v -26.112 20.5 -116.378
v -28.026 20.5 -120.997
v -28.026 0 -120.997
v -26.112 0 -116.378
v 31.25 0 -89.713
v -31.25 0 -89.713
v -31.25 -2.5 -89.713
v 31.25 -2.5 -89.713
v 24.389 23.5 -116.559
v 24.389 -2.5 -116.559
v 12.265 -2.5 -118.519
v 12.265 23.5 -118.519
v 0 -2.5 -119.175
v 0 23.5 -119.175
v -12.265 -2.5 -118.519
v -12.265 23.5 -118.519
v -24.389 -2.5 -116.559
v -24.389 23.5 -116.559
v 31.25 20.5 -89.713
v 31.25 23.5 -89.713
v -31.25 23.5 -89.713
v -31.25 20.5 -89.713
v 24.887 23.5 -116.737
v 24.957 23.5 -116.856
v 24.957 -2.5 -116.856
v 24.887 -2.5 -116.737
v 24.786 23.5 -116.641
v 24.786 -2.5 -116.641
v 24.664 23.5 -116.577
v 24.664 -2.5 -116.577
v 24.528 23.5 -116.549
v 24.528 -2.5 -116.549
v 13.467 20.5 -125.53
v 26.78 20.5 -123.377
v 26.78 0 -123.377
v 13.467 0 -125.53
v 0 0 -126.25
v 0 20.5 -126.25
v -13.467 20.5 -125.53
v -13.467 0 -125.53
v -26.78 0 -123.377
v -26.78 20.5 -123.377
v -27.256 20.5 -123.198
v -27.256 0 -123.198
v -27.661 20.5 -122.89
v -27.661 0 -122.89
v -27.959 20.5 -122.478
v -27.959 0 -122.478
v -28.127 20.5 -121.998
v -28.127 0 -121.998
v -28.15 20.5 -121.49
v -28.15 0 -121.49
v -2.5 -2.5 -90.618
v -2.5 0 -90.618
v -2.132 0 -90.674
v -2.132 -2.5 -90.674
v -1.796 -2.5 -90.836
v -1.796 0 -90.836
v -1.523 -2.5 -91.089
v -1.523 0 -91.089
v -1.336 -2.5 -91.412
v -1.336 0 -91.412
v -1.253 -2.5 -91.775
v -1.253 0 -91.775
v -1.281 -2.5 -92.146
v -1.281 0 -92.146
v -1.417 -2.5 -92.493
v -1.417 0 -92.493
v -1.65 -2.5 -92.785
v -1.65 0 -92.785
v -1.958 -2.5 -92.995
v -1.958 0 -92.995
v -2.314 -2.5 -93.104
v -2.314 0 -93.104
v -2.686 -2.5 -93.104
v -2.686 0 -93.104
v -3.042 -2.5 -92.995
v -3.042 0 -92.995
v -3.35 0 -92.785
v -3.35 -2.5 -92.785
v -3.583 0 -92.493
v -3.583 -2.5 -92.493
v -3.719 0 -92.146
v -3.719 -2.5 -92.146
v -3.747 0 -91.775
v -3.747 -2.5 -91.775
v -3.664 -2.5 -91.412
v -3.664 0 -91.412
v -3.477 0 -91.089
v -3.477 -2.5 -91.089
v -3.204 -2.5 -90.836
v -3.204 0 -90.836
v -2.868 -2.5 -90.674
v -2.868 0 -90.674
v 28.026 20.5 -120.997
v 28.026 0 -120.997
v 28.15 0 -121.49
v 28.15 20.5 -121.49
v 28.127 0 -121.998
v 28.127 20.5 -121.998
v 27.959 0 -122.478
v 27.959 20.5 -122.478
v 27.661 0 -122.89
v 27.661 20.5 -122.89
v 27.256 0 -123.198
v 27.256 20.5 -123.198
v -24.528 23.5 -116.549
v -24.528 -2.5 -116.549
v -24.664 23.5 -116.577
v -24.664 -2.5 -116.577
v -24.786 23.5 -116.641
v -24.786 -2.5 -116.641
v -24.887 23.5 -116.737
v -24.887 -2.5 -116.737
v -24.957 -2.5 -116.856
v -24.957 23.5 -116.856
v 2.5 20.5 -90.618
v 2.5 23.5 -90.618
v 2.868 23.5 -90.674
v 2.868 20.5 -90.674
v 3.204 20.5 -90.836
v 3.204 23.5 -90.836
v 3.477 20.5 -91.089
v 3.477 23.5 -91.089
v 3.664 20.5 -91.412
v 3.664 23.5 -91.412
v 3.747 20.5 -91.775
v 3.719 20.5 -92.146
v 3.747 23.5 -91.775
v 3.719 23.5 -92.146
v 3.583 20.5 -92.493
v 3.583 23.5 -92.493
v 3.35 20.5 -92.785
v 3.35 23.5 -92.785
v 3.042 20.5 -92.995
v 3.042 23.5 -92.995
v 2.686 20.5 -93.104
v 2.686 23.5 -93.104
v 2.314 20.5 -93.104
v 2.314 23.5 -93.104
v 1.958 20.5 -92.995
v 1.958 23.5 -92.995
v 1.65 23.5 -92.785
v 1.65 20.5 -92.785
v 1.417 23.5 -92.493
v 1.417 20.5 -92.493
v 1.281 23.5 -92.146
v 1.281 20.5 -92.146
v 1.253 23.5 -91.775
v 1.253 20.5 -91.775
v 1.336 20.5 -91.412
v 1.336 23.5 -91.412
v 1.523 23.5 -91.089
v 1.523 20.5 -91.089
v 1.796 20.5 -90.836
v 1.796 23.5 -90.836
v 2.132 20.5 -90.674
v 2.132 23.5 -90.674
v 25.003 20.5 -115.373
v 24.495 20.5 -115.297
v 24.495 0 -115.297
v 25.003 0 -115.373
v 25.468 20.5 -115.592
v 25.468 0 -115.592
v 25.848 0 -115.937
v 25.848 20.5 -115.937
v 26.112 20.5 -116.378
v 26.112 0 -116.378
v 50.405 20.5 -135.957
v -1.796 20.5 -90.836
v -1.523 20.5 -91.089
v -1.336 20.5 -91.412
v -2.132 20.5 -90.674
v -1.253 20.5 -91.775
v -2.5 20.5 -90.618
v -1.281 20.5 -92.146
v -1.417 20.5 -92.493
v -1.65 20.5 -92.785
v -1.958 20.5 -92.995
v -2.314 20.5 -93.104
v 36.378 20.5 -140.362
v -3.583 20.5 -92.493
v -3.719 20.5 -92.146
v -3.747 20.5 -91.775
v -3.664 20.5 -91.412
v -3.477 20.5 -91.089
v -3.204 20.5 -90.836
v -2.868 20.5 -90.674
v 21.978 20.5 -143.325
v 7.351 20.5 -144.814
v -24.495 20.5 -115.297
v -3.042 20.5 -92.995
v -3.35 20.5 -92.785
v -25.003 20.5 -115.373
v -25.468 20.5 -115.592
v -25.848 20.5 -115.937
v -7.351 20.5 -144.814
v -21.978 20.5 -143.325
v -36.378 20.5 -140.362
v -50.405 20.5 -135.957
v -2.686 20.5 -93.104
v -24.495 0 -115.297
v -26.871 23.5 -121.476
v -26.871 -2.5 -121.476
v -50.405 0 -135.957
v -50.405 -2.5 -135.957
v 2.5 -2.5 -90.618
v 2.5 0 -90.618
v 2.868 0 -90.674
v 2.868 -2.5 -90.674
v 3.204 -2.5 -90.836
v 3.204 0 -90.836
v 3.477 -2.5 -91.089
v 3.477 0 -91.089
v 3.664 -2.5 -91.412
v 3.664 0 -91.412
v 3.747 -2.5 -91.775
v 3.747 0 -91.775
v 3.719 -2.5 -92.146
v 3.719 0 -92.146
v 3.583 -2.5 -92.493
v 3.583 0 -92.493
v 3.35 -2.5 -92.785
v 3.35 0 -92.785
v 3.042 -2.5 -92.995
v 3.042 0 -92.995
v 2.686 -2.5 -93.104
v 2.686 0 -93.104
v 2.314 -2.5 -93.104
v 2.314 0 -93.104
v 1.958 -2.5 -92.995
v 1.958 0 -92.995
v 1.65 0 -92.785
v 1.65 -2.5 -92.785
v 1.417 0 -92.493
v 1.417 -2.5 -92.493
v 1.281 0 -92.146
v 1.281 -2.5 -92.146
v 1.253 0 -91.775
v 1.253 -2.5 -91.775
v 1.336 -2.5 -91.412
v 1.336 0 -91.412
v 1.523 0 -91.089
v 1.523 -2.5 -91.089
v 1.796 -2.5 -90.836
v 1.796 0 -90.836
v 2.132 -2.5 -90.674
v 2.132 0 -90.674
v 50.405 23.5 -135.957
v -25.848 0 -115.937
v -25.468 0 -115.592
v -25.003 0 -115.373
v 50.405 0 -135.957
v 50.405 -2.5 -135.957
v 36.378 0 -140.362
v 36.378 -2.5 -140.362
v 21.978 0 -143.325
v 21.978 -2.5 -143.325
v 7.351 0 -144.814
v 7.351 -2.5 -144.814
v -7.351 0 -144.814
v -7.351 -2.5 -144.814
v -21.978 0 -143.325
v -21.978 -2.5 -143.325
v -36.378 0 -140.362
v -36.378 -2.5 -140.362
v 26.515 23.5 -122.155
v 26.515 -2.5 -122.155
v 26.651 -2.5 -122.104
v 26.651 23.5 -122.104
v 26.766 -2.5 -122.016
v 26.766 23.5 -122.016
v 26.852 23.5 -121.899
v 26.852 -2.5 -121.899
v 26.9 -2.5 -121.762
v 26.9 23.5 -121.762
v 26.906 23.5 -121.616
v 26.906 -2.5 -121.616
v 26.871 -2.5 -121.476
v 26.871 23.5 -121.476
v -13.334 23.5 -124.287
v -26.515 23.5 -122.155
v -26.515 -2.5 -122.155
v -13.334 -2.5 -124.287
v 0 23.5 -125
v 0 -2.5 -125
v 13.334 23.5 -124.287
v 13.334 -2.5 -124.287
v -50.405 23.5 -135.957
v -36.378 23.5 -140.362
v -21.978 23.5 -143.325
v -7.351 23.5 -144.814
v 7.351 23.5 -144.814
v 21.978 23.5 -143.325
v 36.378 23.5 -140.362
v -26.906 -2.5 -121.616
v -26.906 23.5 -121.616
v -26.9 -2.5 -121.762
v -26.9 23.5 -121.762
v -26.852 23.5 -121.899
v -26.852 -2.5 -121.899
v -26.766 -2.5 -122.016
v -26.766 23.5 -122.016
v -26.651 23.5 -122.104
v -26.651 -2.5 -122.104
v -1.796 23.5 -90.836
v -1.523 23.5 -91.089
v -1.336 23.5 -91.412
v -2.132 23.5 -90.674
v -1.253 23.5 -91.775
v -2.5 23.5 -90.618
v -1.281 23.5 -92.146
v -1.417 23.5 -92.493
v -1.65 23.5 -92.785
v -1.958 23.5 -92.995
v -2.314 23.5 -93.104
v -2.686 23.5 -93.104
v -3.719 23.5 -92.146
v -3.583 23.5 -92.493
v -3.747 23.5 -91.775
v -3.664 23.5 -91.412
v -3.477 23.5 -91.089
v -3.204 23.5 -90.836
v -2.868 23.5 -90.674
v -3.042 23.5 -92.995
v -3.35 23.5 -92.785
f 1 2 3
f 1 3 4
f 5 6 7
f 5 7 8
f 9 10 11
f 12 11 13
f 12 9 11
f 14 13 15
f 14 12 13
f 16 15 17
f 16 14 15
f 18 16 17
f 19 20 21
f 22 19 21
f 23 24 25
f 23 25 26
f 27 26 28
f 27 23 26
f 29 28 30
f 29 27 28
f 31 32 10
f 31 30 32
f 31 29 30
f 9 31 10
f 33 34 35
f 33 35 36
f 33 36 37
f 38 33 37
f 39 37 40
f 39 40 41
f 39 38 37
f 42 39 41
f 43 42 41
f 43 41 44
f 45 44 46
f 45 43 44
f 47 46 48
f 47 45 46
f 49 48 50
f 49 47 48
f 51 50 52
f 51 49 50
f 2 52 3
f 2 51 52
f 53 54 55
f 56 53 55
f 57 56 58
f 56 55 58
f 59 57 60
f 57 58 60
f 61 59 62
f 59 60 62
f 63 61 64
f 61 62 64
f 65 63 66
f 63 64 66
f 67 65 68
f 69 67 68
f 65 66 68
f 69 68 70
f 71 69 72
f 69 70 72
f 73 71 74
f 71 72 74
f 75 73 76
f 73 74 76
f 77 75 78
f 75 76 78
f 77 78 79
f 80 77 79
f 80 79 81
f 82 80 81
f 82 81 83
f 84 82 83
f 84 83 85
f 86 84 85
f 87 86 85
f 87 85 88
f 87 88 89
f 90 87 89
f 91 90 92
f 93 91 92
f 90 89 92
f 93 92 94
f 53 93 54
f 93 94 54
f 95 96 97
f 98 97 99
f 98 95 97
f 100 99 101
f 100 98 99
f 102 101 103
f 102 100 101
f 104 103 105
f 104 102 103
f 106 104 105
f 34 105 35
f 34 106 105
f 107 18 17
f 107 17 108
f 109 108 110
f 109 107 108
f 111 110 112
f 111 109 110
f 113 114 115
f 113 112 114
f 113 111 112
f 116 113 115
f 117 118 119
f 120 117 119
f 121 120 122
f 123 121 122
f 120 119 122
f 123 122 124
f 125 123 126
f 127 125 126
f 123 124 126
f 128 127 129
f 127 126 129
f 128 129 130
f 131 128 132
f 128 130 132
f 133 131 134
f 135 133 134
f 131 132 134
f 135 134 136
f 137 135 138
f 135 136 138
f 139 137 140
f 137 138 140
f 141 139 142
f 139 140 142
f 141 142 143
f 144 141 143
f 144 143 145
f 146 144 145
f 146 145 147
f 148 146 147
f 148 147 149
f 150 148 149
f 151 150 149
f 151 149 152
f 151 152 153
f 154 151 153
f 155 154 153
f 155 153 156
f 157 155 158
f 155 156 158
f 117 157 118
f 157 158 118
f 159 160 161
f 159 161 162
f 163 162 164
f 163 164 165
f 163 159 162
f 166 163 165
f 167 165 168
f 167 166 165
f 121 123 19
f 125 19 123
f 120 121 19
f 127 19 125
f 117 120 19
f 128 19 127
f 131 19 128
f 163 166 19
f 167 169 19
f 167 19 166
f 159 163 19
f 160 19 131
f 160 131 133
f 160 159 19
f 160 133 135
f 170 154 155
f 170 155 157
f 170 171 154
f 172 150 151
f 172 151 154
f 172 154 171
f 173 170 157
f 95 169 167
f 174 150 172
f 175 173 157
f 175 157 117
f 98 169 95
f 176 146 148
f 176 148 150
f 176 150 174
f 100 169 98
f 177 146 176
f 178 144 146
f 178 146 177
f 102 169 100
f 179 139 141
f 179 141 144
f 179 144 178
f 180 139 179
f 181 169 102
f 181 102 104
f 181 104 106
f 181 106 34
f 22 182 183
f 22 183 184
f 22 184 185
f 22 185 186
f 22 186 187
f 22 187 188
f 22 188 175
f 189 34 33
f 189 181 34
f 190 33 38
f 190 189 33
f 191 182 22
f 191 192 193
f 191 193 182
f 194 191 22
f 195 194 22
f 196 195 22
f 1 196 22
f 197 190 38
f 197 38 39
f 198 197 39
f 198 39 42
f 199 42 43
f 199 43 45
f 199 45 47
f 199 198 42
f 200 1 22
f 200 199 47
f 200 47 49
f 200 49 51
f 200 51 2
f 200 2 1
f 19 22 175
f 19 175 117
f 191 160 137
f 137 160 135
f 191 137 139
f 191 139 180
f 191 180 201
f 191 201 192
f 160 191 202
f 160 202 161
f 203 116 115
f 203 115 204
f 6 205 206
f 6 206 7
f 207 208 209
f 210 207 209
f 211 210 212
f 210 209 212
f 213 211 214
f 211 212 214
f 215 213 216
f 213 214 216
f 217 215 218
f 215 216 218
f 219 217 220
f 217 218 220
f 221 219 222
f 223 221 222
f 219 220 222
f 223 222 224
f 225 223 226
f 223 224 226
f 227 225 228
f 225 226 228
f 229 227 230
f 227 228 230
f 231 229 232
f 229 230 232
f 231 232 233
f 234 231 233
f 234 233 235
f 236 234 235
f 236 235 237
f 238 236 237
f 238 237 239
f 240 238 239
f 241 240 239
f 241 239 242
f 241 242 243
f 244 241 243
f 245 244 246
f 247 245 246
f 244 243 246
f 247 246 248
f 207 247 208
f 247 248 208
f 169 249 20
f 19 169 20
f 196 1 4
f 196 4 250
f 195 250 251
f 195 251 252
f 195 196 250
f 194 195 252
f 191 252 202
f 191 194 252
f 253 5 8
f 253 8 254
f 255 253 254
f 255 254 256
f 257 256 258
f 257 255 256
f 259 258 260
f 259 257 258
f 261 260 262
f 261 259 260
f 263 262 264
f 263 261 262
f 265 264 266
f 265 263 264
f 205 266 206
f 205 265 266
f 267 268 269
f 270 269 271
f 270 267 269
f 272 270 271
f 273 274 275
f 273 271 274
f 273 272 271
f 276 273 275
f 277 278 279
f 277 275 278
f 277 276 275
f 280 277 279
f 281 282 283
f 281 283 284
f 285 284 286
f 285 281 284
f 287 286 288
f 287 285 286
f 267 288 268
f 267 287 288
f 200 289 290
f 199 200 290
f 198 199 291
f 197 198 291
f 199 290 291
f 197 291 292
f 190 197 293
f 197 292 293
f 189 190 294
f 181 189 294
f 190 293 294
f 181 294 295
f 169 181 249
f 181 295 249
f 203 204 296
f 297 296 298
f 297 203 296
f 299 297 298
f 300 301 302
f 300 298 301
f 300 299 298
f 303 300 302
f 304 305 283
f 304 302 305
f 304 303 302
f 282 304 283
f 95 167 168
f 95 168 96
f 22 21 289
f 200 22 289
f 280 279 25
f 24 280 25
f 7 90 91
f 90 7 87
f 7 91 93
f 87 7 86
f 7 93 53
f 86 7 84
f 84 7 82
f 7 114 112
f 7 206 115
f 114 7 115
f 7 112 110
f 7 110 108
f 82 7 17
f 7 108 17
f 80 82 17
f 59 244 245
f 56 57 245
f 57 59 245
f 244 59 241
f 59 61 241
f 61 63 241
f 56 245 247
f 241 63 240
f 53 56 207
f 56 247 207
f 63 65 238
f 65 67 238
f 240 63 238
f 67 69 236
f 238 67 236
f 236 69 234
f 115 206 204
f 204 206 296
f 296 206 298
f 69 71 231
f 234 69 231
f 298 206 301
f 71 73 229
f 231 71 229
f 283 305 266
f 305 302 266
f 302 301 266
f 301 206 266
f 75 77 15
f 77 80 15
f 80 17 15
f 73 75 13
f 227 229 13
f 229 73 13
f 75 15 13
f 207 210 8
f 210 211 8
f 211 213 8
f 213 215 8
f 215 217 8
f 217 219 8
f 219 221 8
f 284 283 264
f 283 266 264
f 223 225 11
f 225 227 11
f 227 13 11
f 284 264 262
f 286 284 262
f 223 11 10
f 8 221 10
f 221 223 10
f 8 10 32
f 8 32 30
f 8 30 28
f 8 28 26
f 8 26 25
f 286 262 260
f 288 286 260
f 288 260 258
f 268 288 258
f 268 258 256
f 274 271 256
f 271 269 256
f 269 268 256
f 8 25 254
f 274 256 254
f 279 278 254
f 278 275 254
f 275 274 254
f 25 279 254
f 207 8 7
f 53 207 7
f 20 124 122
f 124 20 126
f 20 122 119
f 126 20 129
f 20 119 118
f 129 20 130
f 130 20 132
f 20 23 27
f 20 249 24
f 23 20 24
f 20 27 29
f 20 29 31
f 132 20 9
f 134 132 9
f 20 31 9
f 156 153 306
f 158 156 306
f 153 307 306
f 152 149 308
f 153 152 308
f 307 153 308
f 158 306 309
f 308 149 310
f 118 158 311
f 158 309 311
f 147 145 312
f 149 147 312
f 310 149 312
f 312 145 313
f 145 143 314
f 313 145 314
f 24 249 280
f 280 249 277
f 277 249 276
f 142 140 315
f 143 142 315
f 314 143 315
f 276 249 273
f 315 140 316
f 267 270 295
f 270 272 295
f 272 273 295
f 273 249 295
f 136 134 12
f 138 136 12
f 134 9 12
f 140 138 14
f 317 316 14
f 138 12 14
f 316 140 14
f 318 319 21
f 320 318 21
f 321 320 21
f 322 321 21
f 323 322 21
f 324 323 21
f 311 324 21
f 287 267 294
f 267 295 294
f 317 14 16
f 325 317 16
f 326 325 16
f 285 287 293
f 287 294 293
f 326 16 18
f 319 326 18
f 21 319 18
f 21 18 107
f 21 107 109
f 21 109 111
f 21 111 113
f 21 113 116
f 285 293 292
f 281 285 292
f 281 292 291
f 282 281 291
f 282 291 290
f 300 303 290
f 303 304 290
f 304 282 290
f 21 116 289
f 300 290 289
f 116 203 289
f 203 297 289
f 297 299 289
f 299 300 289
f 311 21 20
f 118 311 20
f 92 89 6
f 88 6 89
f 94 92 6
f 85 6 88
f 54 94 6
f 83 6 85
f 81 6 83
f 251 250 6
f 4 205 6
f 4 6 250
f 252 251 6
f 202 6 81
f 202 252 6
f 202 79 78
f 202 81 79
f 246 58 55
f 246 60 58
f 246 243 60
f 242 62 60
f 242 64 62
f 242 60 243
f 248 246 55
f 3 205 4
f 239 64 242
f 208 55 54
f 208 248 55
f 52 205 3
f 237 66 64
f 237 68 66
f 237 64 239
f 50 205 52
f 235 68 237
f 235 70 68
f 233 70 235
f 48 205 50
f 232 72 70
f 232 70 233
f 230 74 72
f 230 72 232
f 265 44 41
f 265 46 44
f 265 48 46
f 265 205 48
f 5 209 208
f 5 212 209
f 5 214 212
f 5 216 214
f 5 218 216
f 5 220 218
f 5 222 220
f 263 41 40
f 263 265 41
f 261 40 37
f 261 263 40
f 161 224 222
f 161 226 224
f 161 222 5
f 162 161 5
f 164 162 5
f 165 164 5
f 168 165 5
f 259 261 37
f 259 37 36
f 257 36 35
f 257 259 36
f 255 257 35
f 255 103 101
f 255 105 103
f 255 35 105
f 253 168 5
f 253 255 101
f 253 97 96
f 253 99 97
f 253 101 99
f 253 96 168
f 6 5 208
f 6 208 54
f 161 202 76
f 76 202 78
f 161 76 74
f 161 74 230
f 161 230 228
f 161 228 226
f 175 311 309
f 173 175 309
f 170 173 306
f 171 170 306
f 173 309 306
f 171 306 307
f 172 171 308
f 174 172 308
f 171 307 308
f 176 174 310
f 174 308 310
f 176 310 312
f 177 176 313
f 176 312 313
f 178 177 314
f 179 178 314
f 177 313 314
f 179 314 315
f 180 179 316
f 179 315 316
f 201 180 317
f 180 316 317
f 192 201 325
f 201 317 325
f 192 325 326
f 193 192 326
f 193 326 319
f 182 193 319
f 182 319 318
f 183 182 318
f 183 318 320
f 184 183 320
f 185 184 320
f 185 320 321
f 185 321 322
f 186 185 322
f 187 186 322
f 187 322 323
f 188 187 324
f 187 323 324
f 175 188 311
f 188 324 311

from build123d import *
from build123d.topology import SkipClean

# Parameters (mm, degrees)
SKETCH1_R           = 1.25
BOSS_EXTRUDE1_DEPTH = 2.5
BOSS_EXTRUDE2_START = 23.5
BOSS_EXTRUDE2_DEPTH = 26
BOSS_EXTRUDE3_START = 23.5
SKETCH1_4_R         = 1.25
BOSS_EXTRUDE3_DEPTH = 3


with BuildPart() as part:
    # Sketch1 → Boss-Extrude1 (new body)
    with BuildSketch(Plane(origin=(0, 0, 0), x_dir=(1, 0, 0), z_dir=(0, 1, 0))):
        with BuildLine():
            Line((-50.40491586, 135.957141986), (-31.25, 89.71308433))
            Line((-31.25, 89.71308433), (31.25, 89.71308433))
            Line((31.25, 89.71308433), (50.40491586, 135.957141986))
            ThreePointArc((50.40491586, 135.957141986), (0, 145), (-50.40491586, 135.957141986))
        make_face()
        with Locations(Location((-2.5, 91.868329805, 0), (0, 0, 270))):
            Circle(SKETCH1_R, mode=Mode.SUBTRACT)
        with Locations(Location((2.5, 91.868329805, 0), (0, 0, 270))):
            Circle(SKETCH1_R, mode=Mode.SUBTRACT)
        with BuildLine():
            Line((-26.870747539, 121.475518488), (-24.957330377, 116.856120826))
            ThreePointArc((-24.957330377, 116.856120826), (-24.727253788, 116.604473302), (-24.389349959, 116.558836529))
            ThreePointArc((-24.389349959, 116.558836529), (0, 119.174853647), (24.389349959, 116.558836529))
            ThreePointArc((24.389349959, 116.558836529), (24.727253788, 116.604473302), (24.957330377, 116.856120826))
            Line((24.957330377, 116.856120826), (26.870747539, 121.475518488))
            ThreePointArc((26.870747539, 121.475518488), (26.851801477, 121.898714852), (26.514867242, 122.155482133))
            ThreePointArc((26.514867242, 122.155482133), (0, 125), (-26.514867242, 122.155482133))
            ThreePointArc((-26.514867242, 122.155482133), (-26.851801477, 121.898714852), (-26.870747539, 121.475518488))
        make_face(mode=Mode.SUBTRACT)
    extrude(amount=-BOSS_EXTRUDE1_DEPTH)

    # Sketch1<3> → Boss-Extrude2 (add)
    with SkipClean():  # the faces are left unmerged after this step: merging them gives an invalid solid
        with BuildSketch(Plane(origin=(0, 0, 0), x_dir=(1, 0, 0), z_dir=(0, 1, 0)).offset(BOSS_EXTRUDE2_START)):
            with BuildLine():
                ThreePointArc((-26.780015914, 123.377036954), (-27.959285739, 122.478351471), (-28.025596955, 120.997164198))
                Line((-28.025596955, 120.997164198), (-26.112179793, 116.377766535))
                ThreePointArc((-26.112179793, 116.377766535), (-25.467638519, 115.59239072), (-24.495390611, 115.297462542))
                Line((-24.495390611, 115.297462542), (24.495390611, 115.297462542))
                ThreePointArc((24.495390611, 115.297462542), (25.467638519, 115.59239072), (26.112179793, 116.377766535))
                Line((26.112179793, 116.377766535), (28.025596955, 120.997164198))
                ThreePointArc((28.025596955, 120.997164198), (27.959285739, 122.478351471), (26.780015914, 123.377036954))
                ThreePointArc((26.780015914, 123.377036954), (0, 126.25), (-26.780015914, 123.377036954))
            make_face()
            with BuildLine():
                Line((-24.957330377, 116.856120826), (-26.870747539, 121.475518488))
                ThreePointArc((-26.870747539, 121.475518488), (-26.851801477, 121.898714852), (-26.514867242, 122.155482133))
                ThreePointArc((-26.514867242, 122.155482133), (0, 125), (26.514867242, 122.155482133))
                ThreePointArc((26.514867242, 122.155482133), (26.851801477, 121.898714852), (26.870747539, 121.475518488))
                Line((26.870747539, 121.475518488), (24.957330377, 116.856120826))
                ThreePointArc((24.957330377, 116.856120826), (24.727253788, 116.604473302), (24.389349959, 116.558836529))
                ThreePointArc((24.389349959, 116.558836529), (0, 119.174853647), (-24.389349959, 116.558836529))
                ThreePointArc((-24.389349959, 116.558836529), (-24.727253788, 116.604473302), (-24.957330377, 116.856120826))
            make_face(mode=Mode.SUBTRACT)
        extrude(amount=-BOSS_EXTRUDE2_DEPTH)
    add(part.part.scale(1), mode=Mode.REPLACE)  # the faces are merged on a copy

    # Sketch1<4> → Boss-Extrude3 (add)
    # profile 1 of 2: a face of its own
    with BuildSketch(Plane(origin=(0, 0, 0), x_dir=(1, 0, 0), z_dir=(0, 1, 0)).offset(BOSS_EXTRUDE3_START)):
        with BuildLine():
            ThreePointArc((-50.40491586, 135.957141986), (0, 145), (50.40491586, 135.957141986))
            Line((50.40491586, 135.957141986), (31.25, 89.71308433))
            Line((31.25, 89.71308433), (-31.25, 89.71308433))
            Line((-31.25, 89.71308433), (-50.40491586, 135.957141986))
        make_face()
        with Locations(Location((2.5, 91.868329805, 0), (0, 0, 270))):
            Circle(SKETCH1_4_R, mode=Mode.SUBTRACT)
        with Locations(Location((-2.5, 91.868329805, 0), (0, 0, 270))):
            Circle(SKETCH1_4_R, mode=Mode.SUBTRACT)
        with BuildLine():
            Line((-28.025596955, 120.997164198), (-26.112179793, 116.377766535))
            ThreePointArc((-26.112179793, 116.377766535), (-25.467638519, 115.59239072), (-24.495390611, 115.297462542))
            Line((-24.495390611, 115.297462542), (24.495390611, 115.297462542))
            ThreePointArc((24.495390611, 115.297462542), (25.467638519, 115.59239072), (26.112179793, 116.377766535))
            Line((26.112179793, 116.377766535), (28.025596955, 120.997164198))
            ThreePointArc((28.025596955, 120.997164198), (27.959285739, 122.478351471), (26.780015914, 123.377036954))
            ThreePointArc((26.780015914, 123.377036954), (0, 126.25), (-26.780015914, 123.377036954))
            ThreePointArc((-26.780015914, 123.377036954), (-27.959285739, 122.478351471), (-28.025596955, 120.997164198))
        make_face(mode=Mode.SUBTRACT)
    # profile 2 of 2: a face of its own
    with BuildSketch(Plane(origin=(0, 0, 0), x_dir=(1, 0, 0), z_dir=(0, 1, 0)).offset(BOSS_EXTRUDE3_START)):
        with BuildLine():
            ThreePointArc((-28.025596955, 120.997164198), (-27.959285739, 122.478351471), (-26.780015914, 123.377036954))
            ThreePointArc((-26.780015914, 123.377036954), (0, 126.25), (26.780015914, 123.377036954))
            ThreePointArc((26.780015914, 123.377036954), (27.959285739, 122.478351471), (28.025596955, 120.997164198))
            Line((28.025596955, 120.997164198), (26.112179793, 116.377766535))
            ThreePointArc((26.112179793, 116.377766535), (25.467638519, 115.59239072), (24.495390611, 115.297462542))
            Line((24.495390611, 115.297462542), (-24.495390611, 115.297462542))
            ThreePointArc((-24.495390611, 115.297462542), (-25.467638519, 115.59239072), (-26.112179793, 116.377766535))
            Line((-26.112179793, 116.377766535), (-28.025596955, 120.997164198))
        make_face()
        with BuildLine():
            Line((26.870747539, 121.475518488), (24.957330377, 116.856120826))
            ThreePointArc((24.957330377, 116.856120826), (24.727253788, 116.604473302), (24.389349959, 116.558836529))
            ThreePointArc((24.389349959, 116.558836529), (0, 119.174853647), (-24.389349959, 116.558836529))
            ThreePointArc((-24.389349959, 116.558836529), (-24.727253788, 116.604473302), (-24.957330377, 116.856120826))
            Line((-24.957330377, 116.856120826), (-26.870747539, 121.475518488))
            ThreePointArc((-26.870747539, 121.475518488), (-26.851801477, 121.898714852), (-26.514867242, 122.155482133))
            ThreePointArc((-26.514867242, 122.155482133), (0, 125), (26.514867242, 122.155482133))
            ThreePointArc((26.514867242, 122.155482133), (26.851801477, 121.898714852), (26.870747539, 121.475518488))
        make_face(mode=Mode.SUBTRACT)
    extrude(amount=-BOSS_EXTRUDE3_DEPTH)


solid = part.part
